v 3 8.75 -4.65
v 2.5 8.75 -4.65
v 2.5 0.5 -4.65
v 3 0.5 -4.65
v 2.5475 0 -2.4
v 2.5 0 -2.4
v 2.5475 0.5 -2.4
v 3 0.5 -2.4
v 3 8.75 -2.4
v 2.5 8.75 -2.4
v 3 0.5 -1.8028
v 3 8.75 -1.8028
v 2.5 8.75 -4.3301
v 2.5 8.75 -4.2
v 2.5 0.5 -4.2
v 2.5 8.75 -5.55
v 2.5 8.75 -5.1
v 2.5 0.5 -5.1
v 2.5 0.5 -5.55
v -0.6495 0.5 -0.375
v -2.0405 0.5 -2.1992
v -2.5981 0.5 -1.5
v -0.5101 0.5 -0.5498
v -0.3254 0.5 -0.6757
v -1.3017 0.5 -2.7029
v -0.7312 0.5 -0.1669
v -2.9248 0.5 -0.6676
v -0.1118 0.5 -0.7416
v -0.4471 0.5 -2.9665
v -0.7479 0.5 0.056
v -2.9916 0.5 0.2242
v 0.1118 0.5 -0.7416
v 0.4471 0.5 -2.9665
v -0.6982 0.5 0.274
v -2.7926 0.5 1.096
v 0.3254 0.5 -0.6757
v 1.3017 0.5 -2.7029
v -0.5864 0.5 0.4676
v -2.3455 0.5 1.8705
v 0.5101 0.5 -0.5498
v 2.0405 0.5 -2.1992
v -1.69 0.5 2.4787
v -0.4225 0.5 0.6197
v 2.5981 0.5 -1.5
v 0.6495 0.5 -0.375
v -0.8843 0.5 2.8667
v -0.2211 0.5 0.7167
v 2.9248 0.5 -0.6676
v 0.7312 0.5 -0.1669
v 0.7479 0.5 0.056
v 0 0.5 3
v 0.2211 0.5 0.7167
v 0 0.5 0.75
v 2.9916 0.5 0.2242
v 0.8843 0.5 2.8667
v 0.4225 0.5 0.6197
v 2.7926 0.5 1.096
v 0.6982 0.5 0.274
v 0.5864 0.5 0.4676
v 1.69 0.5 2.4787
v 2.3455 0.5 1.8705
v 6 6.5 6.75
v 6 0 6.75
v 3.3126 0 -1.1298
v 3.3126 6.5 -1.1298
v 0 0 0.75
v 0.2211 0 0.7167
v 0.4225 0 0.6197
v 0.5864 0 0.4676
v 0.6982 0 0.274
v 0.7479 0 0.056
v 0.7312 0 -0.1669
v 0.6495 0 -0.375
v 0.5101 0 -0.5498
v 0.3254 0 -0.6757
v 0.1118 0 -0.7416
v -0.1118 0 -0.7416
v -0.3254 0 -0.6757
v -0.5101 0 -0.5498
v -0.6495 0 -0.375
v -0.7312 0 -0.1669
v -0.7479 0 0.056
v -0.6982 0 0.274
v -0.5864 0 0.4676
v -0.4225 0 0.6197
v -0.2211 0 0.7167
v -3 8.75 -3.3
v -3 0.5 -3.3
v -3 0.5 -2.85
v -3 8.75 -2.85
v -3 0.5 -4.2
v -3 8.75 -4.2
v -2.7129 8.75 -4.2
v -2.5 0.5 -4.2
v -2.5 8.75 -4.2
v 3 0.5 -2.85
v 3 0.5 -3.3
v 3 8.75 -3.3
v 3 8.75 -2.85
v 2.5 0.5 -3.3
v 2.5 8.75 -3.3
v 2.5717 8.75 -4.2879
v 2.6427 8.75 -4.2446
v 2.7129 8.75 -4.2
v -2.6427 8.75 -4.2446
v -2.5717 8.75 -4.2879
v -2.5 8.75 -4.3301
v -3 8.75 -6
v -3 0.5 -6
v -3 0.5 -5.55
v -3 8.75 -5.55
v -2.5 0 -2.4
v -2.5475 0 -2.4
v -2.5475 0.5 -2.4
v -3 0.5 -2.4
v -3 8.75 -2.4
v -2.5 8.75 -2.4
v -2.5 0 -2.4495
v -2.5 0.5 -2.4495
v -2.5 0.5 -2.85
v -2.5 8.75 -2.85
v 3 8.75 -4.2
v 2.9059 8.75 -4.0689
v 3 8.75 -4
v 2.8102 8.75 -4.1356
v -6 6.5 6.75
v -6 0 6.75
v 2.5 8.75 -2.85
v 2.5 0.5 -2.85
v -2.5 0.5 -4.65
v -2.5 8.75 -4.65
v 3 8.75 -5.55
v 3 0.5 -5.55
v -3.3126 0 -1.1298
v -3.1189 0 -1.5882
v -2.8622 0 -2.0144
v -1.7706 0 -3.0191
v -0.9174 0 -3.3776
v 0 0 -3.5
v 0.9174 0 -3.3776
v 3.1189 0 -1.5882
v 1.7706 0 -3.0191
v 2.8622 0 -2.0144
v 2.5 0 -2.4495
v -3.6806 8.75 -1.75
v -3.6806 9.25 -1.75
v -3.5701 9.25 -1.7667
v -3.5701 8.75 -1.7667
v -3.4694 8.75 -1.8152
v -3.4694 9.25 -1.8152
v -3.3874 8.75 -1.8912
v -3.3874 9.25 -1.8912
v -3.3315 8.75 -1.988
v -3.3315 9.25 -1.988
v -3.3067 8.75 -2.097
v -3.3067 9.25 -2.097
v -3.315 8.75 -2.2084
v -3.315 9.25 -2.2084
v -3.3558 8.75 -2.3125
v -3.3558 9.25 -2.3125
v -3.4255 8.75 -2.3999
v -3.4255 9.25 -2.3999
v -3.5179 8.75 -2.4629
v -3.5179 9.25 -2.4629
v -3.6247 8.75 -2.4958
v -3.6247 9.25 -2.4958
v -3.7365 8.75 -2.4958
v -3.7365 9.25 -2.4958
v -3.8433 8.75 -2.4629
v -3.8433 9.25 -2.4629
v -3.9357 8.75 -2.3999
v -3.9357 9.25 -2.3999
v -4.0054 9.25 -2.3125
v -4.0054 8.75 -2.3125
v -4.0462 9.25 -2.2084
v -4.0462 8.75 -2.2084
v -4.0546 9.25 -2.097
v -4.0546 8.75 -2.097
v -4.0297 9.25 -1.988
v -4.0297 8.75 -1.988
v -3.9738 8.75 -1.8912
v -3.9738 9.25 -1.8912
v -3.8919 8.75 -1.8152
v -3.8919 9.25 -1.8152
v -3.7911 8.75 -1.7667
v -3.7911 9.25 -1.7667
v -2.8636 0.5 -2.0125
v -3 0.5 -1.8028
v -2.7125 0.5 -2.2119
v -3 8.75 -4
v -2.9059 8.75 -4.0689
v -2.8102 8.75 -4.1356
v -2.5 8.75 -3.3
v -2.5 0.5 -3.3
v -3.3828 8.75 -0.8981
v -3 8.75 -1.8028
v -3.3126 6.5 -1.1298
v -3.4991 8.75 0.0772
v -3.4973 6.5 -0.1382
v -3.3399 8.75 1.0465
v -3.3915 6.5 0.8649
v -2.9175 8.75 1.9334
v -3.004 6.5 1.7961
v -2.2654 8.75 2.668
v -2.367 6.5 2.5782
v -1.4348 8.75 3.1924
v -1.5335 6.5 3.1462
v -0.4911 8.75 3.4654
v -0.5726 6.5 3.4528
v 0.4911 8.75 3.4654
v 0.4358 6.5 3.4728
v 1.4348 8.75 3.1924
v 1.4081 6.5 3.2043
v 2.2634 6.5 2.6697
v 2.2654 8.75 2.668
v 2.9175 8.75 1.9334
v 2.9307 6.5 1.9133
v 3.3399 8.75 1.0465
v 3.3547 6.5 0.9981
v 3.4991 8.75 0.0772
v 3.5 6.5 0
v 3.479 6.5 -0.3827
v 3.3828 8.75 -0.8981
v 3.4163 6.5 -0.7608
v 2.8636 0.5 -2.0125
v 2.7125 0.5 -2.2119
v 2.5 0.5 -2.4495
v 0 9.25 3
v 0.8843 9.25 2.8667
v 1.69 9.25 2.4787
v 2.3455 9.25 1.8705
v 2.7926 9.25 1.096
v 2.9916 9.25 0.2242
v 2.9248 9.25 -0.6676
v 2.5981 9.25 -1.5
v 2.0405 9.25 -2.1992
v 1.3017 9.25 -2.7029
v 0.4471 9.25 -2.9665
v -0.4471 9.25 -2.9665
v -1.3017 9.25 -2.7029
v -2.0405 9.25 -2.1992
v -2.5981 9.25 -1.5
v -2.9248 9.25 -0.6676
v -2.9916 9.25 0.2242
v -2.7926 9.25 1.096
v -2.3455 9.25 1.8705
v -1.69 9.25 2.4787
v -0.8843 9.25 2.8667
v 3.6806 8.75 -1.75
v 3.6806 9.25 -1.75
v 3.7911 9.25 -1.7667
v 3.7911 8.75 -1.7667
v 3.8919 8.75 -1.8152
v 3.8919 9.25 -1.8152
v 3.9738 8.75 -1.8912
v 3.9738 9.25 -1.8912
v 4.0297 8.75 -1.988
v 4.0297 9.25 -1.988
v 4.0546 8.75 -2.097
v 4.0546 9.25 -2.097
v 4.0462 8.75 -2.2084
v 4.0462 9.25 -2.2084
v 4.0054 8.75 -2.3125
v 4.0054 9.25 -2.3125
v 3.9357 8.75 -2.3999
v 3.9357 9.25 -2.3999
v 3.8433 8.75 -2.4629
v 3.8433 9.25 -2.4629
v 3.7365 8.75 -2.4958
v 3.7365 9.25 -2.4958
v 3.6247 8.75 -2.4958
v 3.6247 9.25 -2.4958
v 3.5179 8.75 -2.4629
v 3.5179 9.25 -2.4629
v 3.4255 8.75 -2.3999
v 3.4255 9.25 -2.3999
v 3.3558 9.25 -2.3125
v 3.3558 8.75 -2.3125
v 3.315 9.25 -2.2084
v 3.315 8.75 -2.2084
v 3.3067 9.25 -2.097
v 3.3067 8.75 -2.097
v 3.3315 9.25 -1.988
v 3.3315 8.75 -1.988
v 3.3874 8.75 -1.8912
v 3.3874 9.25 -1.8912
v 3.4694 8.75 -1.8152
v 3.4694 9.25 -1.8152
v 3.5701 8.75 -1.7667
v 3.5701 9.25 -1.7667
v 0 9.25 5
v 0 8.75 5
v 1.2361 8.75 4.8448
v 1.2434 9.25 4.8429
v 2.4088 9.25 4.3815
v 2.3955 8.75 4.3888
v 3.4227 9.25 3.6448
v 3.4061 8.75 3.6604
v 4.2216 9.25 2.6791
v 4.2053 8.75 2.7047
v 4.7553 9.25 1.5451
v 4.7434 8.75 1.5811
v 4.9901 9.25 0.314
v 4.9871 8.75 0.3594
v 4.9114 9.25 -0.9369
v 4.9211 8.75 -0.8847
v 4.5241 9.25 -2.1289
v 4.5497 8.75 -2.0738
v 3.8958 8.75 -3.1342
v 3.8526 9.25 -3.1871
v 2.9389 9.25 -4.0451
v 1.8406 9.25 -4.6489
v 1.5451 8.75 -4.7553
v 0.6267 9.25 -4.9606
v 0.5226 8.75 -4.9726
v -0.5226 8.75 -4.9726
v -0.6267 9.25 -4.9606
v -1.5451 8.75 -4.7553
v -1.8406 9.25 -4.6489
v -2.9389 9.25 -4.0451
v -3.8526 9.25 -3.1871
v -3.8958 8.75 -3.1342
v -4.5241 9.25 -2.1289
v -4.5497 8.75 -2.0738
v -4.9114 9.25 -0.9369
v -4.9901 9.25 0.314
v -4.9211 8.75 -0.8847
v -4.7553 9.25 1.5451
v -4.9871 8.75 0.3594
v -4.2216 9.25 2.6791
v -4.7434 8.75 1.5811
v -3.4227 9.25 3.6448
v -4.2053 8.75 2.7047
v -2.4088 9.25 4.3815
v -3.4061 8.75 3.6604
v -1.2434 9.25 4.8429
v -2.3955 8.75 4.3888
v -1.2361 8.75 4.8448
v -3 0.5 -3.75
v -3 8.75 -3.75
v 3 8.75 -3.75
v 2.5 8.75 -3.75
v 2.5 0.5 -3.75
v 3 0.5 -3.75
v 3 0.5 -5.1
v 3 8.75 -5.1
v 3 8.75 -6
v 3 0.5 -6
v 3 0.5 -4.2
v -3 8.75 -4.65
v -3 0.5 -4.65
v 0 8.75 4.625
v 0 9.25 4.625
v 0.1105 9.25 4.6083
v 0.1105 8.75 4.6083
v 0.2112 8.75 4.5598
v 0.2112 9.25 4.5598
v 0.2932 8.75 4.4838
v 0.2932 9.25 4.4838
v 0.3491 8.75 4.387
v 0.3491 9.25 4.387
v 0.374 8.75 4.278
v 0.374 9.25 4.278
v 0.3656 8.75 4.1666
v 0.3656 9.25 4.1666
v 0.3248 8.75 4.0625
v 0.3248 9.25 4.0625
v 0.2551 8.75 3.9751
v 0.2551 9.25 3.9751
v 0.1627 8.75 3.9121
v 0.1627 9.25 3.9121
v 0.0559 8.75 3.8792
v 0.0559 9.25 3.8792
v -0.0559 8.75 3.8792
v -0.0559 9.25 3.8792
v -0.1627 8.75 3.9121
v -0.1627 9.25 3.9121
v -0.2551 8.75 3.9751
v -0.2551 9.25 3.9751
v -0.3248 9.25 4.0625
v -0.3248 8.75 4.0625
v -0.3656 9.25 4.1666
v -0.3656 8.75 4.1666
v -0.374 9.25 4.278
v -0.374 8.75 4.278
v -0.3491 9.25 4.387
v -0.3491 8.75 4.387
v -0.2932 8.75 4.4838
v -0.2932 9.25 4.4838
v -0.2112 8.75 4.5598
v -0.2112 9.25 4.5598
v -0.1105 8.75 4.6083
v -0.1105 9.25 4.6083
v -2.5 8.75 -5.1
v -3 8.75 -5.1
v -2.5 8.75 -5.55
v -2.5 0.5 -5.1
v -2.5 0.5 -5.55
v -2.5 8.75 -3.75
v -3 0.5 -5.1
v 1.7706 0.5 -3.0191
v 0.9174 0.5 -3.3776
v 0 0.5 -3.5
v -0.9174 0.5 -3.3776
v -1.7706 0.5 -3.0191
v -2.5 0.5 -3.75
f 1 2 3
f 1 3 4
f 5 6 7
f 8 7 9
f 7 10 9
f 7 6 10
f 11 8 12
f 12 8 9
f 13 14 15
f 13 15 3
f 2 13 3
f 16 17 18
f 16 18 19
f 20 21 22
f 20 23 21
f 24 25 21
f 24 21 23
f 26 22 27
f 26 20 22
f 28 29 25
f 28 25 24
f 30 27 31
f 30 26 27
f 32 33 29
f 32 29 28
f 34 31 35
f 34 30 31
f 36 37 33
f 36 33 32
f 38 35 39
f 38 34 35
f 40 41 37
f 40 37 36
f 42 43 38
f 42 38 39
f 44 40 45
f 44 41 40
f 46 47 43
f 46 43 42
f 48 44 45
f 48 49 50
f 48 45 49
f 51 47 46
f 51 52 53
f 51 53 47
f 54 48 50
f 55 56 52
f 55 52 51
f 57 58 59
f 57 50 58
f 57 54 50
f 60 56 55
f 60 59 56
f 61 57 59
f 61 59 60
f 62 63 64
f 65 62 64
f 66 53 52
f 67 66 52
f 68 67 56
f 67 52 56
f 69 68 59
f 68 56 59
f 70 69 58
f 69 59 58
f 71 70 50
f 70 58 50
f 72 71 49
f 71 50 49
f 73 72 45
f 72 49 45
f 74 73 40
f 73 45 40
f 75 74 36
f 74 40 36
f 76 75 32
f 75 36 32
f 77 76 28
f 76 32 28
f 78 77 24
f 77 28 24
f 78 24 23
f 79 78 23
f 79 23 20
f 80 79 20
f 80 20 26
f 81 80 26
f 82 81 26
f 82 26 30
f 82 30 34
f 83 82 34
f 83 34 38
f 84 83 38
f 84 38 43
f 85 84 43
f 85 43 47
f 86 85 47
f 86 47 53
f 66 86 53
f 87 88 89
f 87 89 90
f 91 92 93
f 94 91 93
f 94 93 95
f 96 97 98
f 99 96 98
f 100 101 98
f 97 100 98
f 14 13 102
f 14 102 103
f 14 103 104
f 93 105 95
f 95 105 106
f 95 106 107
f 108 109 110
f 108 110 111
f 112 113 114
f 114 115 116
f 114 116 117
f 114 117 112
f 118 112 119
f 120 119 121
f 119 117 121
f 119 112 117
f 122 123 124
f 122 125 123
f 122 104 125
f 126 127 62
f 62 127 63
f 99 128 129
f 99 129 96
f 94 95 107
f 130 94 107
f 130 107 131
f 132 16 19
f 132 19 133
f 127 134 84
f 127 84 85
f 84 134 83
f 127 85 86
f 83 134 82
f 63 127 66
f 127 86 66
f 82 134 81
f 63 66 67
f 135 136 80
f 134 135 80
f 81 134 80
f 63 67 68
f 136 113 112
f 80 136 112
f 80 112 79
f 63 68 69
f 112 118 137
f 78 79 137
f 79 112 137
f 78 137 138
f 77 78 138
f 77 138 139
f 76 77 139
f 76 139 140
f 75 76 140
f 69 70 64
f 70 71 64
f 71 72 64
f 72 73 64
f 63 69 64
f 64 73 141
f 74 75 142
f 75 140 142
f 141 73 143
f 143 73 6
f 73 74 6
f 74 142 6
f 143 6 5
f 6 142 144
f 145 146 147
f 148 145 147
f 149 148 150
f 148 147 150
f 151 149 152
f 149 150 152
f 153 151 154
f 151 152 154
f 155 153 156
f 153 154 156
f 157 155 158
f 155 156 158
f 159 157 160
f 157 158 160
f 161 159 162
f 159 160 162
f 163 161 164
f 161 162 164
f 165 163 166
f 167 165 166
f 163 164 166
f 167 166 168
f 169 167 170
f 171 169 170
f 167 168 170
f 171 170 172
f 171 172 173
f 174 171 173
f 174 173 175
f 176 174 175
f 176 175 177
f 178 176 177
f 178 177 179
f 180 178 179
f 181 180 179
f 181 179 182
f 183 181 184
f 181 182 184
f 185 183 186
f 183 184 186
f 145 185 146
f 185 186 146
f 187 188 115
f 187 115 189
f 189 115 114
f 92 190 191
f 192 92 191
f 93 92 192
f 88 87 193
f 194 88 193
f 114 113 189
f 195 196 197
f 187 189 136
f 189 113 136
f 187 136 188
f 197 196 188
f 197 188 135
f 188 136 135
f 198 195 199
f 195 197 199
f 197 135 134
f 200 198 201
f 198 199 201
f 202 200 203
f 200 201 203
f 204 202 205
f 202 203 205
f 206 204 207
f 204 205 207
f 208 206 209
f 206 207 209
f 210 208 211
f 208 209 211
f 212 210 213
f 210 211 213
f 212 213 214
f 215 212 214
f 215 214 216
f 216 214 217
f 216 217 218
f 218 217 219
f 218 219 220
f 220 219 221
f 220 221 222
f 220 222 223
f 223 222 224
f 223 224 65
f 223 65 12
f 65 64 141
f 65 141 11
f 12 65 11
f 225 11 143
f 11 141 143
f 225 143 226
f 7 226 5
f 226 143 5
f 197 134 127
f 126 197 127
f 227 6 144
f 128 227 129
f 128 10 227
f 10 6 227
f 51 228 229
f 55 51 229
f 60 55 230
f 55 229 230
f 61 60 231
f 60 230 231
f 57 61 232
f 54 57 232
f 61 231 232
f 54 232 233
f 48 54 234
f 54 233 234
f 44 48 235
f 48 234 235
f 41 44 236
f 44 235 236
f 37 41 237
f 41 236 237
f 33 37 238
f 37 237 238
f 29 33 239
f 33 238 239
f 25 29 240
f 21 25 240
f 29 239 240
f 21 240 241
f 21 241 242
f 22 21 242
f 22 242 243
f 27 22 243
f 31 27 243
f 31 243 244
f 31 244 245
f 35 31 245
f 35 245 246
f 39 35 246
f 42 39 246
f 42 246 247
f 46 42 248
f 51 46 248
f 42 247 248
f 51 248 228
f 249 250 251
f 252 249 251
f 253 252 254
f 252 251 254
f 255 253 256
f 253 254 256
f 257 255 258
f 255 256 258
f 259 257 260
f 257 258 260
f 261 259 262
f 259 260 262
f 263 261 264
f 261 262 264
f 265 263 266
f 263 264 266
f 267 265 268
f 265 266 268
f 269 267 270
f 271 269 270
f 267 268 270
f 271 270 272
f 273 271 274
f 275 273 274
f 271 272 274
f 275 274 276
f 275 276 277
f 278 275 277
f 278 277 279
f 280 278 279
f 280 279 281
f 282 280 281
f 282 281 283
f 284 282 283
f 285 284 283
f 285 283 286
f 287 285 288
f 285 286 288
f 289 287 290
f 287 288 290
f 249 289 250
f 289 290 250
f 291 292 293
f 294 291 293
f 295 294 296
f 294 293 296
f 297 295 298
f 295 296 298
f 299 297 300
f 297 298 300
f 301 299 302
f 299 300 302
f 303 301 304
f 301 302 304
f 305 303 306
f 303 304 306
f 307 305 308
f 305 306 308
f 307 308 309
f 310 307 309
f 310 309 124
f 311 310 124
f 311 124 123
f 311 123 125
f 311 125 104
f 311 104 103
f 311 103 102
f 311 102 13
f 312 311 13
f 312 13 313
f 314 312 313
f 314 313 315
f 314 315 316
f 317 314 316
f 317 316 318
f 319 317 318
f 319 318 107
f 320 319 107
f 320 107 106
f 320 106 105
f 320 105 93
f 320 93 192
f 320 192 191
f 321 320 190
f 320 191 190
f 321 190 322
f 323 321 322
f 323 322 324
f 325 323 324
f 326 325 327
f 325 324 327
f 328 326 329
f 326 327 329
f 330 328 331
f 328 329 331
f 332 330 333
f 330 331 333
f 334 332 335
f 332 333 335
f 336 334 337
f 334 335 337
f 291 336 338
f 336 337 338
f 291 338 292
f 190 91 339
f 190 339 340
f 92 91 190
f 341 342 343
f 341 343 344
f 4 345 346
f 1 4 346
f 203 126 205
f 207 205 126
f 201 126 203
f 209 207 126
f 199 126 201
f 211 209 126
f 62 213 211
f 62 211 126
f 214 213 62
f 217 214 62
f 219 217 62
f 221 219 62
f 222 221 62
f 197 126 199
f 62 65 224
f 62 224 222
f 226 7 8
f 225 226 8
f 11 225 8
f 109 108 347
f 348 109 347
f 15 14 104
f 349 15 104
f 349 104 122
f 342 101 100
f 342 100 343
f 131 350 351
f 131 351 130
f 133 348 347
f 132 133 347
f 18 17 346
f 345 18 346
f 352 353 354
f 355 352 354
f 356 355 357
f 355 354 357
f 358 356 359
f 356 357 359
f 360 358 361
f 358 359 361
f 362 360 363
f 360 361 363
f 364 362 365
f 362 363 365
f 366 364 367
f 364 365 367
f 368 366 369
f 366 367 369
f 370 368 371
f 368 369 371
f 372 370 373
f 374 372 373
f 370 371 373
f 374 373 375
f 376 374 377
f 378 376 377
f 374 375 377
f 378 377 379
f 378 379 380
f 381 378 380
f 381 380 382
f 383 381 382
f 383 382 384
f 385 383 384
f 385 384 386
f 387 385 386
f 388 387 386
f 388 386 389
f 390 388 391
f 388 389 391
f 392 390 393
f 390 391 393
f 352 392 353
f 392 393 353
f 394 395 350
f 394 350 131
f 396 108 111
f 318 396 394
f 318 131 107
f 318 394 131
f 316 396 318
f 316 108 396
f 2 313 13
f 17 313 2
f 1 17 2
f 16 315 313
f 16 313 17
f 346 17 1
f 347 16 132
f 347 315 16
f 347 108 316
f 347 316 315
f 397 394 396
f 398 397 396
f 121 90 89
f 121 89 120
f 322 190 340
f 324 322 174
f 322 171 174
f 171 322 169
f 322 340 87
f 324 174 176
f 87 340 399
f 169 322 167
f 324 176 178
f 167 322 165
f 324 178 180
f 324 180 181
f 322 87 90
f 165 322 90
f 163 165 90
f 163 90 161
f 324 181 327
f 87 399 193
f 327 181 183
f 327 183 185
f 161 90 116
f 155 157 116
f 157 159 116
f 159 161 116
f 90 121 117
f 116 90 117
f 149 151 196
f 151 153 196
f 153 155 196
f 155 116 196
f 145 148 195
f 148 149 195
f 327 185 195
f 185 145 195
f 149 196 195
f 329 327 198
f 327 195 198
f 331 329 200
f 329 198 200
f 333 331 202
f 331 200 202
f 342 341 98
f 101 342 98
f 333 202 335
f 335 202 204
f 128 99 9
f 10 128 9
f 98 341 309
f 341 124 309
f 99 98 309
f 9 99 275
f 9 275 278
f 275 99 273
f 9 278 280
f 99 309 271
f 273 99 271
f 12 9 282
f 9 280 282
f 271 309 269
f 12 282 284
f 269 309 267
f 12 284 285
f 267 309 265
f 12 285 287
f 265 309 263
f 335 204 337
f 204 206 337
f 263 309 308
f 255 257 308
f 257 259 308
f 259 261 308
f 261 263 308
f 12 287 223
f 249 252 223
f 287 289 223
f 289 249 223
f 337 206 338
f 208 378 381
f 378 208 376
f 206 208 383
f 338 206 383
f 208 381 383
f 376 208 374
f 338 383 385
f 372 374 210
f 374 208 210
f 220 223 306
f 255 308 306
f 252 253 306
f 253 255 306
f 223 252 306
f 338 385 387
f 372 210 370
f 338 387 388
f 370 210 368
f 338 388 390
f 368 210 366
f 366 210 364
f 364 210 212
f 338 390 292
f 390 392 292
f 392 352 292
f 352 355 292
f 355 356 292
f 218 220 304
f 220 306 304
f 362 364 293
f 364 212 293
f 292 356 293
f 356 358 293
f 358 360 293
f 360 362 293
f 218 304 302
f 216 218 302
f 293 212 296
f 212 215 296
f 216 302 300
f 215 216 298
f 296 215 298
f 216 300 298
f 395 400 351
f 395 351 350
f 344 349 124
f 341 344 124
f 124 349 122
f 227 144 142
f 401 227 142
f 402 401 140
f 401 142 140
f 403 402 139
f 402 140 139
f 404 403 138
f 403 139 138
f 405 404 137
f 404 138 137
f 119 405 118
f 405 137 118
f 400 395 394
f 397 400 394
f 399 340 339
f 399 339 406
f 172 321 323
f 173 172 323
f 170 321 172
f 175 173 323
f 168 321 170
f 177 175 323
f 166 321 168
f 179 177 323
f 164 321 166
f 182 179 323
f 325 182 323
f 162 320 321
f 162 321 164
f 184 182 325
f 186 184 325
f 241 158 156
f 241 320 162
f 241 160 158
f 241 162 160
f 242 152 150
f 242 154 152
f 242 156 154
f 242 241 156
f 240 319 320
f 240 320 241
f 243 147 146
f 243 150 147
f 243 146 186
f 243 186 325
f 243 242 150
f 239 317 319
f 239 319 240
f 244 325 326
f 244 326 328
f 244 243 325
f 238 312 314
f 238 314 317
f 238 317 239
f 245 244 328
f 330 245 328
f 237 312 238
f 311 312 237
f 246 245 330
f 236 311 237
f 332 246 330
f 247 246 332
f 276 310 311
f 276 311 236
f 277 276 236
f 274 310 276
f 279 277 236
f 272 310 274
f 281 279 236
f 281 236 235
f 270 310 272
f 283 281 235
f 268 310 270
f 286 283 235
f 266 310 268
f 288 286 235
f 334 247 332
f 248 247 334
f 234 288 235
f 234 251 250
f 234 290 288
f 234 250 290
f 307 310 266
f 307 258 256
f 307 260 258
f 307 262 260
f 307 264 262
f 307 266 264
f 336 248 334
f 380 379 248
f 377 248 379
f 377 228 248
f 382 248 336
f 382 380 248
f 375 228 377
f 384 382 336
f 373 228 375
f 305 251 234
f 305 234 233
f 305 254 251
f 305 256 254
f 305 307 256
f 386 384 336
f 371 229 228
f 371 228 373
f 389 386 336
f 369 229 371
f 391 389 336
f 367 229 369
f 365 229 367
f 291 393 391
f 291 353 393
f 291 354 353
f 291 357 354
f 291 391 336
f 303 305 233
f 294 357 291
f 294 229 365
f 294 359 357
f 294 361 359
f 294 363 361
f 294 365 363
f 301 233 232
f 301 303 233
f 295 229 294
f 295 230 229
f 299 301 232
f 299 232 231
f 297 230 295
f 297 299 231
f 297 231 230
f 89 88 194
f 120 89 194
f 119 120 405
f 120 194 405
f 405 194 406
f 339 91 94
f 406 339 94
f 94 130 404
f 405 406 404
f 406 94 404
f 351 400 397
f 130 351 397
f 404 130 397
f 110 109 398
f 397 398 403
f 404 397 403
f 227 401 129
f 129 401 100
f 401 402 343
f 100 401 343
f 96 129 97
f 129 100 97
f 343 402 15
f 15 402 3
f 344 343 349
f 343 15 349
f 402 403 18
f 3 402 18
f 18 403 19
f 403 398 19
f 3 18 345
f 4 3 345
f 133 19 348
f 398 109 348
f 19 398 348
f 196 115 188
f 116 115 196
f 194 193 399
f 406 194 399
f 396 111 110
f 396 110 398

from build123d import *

# Parameters (mm, degrees)
BOSS_EXTRUDE2_DEPTH  = 8.75
BOSS_EXTRUDE3_DEPTH  = 6.5
SKETCH2_R            = 5
BOSS_EXTRUDE4_DEPTH  = 0.5
SKETCH4_W            = 6
SKETCH4_H            = 8.25
BOSS_EXTRUDE5_DEPTH  = 6
SKETCH5_W            = 0.5
SKETCH5_H            = 0.45
CUT_EXTRUDE2_DEPTH   = 13.57477634
LPATTERN1_COUNT      = 4
LPATTERN1_PITCH      = 0.9
LPATTERN1_COUNT_DIR2 = 2
LPATTERN1_PITCH_DIR2 = 5.5
SKETCH6_R            = 3
SKETCH6_R_2          = 0.75
CUT_EXTRUDE3_DEPTH   = 8.75
SKETCH7_R            = 0.75
CUT_EXTRUDE4_DEPTH   = 13.927683474
SKETCH8_R            = 0.375
CUT_EXTRUDE5_DEPTH   = 0.5


with BuildPart() as part:
    # Sketch1 → Boss-Extrude2 (new body)
    with BuildSketch(Plane(origin=(0, 0, 0), x_dir=(1, 0, 0), z_dir=(0, 1, 0))):
        with BuildLine():
            ThreePointArc((3.312648335, 1.129761483), (0, 3.5), (-3.312648335, 1.129761483))
            ThreePointArc((-3.312648335, 1.129761483), (-0.572595332, -3.45284442), (3.5, 0))
            ThreePointArc((3.5, 0), (3.45284442, 0.572595332), (3.312648335, 1.129761483))
        make_face()
    extrude(amount=BOSS_EXTRUDE2_DEPTH)

    # Sketch1<3> → Boss-Extrude3 (add)
    with BuildSketch(Plane(origin=(0, 0, 0), x_dir=(1, 0, 0), z_dir=(0, 1, 0))):
        with BuildLine():
            Line((-3.312648335, 1.129761483), (-6, -6.75))
            Line((-6, -6.75), (6, -6.75))
            Line((6, -6.75), (3.312648335, 1.129761483))
            ThreePointArc((3.312648335, 1.129761483), (3.45284442, 0.572595332), (3.5, 0))
            ThreePointArc((3.5, 0), (-0.572595332, -3.45284442), (-3.312648335, 1.129761483))
        make_face()
    extrude(amount=BOSS_EXTRUDE3_DEPTH)

    # Sketch2 → Boss-Extrude4 (add)
    with BuildSketch(Plane(origin=(0, 8.75, 0), x_dir=(1, 0, 0), z_dir=(0, 1, 0))):
        Circle(SKETCH2_R)
    extrude(amount=BOSS_EXTRUDE4_DEPTH)

    # Sketch4 → Boss-Extrude5 (add)
    with BuildSketch(Plane.XY.offset(-6)):
        with Locations((0, 4.625)):
            Rectangle(SKETCH4_W, SKETCH4_H)
    extrude(amount=BOSS_EXTRUDE5_DEPTH)

    # Sketch5 → Cut-Extrude2 (cut, through all)
    with BuildSketch(Plane(origin=(0, 8.75, 0), x_dir=(1, 0, 0), z_dir=(0, 1, 0))):
        with Locations((2.75, 5.325)):
            Rectangle(SKETCH5_W, SKETCH5_H)
    cut_extrude2 = extrude(amount=-CUT_EXTRUDE2_DEPTH, mode=Mode.SUBTRACT)

    # LPattern1: Cut-Extrude2 4 × 2
    with Locations(*[(-j * LPATTERN1_PITCH_DIR2, 0, i * LPATTERN1_PITCH) for i in range(LPATTERN1_COUNT) for j in range(LPATTERN1_COUNT_DIR2) if (i, j) != (0, 0)]):
        add(cut_extrude2, mode=Mode.SUBTRACT)

    # Sketch6 → Cut-Extrude3 (cut)
    with BuildSketch(Plane(origin=(0, 9.25, 0), x_dir=(1, 0, 0), z_dir=(0, 1, 0))):
        Circle(SKETCH6_R)
        Circle(SKETCH6_R_2, mode=Mode.SUBTRACT)
    extrude(amount=-CUT_EXTRUDE3_DEPTH, mode=Mode.SUBTRACT)

    # Sketch7 → Cut-Extrude4 (cut, through all)
    with BuildSketch(Plane(origin=(0, 9.25, 0), x_dir=(1, 0, 0), z_dir=(0, 1, 0))):
        Circle(SKETCH7_R)
    extrude(amount=-CUT_EXTRUDE4_DEPTH, mode=Mode.SUBTRACT)

    # Sketch8 → Cut-Extrude5 (cut)
    with BuildSketch(Plane(origin=(0, 9.25, 0), x_dir=(1, 0, 0), z_dir=(0, 1, 0))):
        with Locations((0, -4.25)):
            Circle(SKETCH8_R)
        with Locations((-3.680607966, 2.125)):
            Circle(SKETCH8_R)
        with Locations((3.680607966, 2.125)):
            Circle(SKETCH8_R)
    extrude(amount=-CUT_EXTRUDE5_DEPTH, mode=Mode.SUBTRACT)


solid = part.part
